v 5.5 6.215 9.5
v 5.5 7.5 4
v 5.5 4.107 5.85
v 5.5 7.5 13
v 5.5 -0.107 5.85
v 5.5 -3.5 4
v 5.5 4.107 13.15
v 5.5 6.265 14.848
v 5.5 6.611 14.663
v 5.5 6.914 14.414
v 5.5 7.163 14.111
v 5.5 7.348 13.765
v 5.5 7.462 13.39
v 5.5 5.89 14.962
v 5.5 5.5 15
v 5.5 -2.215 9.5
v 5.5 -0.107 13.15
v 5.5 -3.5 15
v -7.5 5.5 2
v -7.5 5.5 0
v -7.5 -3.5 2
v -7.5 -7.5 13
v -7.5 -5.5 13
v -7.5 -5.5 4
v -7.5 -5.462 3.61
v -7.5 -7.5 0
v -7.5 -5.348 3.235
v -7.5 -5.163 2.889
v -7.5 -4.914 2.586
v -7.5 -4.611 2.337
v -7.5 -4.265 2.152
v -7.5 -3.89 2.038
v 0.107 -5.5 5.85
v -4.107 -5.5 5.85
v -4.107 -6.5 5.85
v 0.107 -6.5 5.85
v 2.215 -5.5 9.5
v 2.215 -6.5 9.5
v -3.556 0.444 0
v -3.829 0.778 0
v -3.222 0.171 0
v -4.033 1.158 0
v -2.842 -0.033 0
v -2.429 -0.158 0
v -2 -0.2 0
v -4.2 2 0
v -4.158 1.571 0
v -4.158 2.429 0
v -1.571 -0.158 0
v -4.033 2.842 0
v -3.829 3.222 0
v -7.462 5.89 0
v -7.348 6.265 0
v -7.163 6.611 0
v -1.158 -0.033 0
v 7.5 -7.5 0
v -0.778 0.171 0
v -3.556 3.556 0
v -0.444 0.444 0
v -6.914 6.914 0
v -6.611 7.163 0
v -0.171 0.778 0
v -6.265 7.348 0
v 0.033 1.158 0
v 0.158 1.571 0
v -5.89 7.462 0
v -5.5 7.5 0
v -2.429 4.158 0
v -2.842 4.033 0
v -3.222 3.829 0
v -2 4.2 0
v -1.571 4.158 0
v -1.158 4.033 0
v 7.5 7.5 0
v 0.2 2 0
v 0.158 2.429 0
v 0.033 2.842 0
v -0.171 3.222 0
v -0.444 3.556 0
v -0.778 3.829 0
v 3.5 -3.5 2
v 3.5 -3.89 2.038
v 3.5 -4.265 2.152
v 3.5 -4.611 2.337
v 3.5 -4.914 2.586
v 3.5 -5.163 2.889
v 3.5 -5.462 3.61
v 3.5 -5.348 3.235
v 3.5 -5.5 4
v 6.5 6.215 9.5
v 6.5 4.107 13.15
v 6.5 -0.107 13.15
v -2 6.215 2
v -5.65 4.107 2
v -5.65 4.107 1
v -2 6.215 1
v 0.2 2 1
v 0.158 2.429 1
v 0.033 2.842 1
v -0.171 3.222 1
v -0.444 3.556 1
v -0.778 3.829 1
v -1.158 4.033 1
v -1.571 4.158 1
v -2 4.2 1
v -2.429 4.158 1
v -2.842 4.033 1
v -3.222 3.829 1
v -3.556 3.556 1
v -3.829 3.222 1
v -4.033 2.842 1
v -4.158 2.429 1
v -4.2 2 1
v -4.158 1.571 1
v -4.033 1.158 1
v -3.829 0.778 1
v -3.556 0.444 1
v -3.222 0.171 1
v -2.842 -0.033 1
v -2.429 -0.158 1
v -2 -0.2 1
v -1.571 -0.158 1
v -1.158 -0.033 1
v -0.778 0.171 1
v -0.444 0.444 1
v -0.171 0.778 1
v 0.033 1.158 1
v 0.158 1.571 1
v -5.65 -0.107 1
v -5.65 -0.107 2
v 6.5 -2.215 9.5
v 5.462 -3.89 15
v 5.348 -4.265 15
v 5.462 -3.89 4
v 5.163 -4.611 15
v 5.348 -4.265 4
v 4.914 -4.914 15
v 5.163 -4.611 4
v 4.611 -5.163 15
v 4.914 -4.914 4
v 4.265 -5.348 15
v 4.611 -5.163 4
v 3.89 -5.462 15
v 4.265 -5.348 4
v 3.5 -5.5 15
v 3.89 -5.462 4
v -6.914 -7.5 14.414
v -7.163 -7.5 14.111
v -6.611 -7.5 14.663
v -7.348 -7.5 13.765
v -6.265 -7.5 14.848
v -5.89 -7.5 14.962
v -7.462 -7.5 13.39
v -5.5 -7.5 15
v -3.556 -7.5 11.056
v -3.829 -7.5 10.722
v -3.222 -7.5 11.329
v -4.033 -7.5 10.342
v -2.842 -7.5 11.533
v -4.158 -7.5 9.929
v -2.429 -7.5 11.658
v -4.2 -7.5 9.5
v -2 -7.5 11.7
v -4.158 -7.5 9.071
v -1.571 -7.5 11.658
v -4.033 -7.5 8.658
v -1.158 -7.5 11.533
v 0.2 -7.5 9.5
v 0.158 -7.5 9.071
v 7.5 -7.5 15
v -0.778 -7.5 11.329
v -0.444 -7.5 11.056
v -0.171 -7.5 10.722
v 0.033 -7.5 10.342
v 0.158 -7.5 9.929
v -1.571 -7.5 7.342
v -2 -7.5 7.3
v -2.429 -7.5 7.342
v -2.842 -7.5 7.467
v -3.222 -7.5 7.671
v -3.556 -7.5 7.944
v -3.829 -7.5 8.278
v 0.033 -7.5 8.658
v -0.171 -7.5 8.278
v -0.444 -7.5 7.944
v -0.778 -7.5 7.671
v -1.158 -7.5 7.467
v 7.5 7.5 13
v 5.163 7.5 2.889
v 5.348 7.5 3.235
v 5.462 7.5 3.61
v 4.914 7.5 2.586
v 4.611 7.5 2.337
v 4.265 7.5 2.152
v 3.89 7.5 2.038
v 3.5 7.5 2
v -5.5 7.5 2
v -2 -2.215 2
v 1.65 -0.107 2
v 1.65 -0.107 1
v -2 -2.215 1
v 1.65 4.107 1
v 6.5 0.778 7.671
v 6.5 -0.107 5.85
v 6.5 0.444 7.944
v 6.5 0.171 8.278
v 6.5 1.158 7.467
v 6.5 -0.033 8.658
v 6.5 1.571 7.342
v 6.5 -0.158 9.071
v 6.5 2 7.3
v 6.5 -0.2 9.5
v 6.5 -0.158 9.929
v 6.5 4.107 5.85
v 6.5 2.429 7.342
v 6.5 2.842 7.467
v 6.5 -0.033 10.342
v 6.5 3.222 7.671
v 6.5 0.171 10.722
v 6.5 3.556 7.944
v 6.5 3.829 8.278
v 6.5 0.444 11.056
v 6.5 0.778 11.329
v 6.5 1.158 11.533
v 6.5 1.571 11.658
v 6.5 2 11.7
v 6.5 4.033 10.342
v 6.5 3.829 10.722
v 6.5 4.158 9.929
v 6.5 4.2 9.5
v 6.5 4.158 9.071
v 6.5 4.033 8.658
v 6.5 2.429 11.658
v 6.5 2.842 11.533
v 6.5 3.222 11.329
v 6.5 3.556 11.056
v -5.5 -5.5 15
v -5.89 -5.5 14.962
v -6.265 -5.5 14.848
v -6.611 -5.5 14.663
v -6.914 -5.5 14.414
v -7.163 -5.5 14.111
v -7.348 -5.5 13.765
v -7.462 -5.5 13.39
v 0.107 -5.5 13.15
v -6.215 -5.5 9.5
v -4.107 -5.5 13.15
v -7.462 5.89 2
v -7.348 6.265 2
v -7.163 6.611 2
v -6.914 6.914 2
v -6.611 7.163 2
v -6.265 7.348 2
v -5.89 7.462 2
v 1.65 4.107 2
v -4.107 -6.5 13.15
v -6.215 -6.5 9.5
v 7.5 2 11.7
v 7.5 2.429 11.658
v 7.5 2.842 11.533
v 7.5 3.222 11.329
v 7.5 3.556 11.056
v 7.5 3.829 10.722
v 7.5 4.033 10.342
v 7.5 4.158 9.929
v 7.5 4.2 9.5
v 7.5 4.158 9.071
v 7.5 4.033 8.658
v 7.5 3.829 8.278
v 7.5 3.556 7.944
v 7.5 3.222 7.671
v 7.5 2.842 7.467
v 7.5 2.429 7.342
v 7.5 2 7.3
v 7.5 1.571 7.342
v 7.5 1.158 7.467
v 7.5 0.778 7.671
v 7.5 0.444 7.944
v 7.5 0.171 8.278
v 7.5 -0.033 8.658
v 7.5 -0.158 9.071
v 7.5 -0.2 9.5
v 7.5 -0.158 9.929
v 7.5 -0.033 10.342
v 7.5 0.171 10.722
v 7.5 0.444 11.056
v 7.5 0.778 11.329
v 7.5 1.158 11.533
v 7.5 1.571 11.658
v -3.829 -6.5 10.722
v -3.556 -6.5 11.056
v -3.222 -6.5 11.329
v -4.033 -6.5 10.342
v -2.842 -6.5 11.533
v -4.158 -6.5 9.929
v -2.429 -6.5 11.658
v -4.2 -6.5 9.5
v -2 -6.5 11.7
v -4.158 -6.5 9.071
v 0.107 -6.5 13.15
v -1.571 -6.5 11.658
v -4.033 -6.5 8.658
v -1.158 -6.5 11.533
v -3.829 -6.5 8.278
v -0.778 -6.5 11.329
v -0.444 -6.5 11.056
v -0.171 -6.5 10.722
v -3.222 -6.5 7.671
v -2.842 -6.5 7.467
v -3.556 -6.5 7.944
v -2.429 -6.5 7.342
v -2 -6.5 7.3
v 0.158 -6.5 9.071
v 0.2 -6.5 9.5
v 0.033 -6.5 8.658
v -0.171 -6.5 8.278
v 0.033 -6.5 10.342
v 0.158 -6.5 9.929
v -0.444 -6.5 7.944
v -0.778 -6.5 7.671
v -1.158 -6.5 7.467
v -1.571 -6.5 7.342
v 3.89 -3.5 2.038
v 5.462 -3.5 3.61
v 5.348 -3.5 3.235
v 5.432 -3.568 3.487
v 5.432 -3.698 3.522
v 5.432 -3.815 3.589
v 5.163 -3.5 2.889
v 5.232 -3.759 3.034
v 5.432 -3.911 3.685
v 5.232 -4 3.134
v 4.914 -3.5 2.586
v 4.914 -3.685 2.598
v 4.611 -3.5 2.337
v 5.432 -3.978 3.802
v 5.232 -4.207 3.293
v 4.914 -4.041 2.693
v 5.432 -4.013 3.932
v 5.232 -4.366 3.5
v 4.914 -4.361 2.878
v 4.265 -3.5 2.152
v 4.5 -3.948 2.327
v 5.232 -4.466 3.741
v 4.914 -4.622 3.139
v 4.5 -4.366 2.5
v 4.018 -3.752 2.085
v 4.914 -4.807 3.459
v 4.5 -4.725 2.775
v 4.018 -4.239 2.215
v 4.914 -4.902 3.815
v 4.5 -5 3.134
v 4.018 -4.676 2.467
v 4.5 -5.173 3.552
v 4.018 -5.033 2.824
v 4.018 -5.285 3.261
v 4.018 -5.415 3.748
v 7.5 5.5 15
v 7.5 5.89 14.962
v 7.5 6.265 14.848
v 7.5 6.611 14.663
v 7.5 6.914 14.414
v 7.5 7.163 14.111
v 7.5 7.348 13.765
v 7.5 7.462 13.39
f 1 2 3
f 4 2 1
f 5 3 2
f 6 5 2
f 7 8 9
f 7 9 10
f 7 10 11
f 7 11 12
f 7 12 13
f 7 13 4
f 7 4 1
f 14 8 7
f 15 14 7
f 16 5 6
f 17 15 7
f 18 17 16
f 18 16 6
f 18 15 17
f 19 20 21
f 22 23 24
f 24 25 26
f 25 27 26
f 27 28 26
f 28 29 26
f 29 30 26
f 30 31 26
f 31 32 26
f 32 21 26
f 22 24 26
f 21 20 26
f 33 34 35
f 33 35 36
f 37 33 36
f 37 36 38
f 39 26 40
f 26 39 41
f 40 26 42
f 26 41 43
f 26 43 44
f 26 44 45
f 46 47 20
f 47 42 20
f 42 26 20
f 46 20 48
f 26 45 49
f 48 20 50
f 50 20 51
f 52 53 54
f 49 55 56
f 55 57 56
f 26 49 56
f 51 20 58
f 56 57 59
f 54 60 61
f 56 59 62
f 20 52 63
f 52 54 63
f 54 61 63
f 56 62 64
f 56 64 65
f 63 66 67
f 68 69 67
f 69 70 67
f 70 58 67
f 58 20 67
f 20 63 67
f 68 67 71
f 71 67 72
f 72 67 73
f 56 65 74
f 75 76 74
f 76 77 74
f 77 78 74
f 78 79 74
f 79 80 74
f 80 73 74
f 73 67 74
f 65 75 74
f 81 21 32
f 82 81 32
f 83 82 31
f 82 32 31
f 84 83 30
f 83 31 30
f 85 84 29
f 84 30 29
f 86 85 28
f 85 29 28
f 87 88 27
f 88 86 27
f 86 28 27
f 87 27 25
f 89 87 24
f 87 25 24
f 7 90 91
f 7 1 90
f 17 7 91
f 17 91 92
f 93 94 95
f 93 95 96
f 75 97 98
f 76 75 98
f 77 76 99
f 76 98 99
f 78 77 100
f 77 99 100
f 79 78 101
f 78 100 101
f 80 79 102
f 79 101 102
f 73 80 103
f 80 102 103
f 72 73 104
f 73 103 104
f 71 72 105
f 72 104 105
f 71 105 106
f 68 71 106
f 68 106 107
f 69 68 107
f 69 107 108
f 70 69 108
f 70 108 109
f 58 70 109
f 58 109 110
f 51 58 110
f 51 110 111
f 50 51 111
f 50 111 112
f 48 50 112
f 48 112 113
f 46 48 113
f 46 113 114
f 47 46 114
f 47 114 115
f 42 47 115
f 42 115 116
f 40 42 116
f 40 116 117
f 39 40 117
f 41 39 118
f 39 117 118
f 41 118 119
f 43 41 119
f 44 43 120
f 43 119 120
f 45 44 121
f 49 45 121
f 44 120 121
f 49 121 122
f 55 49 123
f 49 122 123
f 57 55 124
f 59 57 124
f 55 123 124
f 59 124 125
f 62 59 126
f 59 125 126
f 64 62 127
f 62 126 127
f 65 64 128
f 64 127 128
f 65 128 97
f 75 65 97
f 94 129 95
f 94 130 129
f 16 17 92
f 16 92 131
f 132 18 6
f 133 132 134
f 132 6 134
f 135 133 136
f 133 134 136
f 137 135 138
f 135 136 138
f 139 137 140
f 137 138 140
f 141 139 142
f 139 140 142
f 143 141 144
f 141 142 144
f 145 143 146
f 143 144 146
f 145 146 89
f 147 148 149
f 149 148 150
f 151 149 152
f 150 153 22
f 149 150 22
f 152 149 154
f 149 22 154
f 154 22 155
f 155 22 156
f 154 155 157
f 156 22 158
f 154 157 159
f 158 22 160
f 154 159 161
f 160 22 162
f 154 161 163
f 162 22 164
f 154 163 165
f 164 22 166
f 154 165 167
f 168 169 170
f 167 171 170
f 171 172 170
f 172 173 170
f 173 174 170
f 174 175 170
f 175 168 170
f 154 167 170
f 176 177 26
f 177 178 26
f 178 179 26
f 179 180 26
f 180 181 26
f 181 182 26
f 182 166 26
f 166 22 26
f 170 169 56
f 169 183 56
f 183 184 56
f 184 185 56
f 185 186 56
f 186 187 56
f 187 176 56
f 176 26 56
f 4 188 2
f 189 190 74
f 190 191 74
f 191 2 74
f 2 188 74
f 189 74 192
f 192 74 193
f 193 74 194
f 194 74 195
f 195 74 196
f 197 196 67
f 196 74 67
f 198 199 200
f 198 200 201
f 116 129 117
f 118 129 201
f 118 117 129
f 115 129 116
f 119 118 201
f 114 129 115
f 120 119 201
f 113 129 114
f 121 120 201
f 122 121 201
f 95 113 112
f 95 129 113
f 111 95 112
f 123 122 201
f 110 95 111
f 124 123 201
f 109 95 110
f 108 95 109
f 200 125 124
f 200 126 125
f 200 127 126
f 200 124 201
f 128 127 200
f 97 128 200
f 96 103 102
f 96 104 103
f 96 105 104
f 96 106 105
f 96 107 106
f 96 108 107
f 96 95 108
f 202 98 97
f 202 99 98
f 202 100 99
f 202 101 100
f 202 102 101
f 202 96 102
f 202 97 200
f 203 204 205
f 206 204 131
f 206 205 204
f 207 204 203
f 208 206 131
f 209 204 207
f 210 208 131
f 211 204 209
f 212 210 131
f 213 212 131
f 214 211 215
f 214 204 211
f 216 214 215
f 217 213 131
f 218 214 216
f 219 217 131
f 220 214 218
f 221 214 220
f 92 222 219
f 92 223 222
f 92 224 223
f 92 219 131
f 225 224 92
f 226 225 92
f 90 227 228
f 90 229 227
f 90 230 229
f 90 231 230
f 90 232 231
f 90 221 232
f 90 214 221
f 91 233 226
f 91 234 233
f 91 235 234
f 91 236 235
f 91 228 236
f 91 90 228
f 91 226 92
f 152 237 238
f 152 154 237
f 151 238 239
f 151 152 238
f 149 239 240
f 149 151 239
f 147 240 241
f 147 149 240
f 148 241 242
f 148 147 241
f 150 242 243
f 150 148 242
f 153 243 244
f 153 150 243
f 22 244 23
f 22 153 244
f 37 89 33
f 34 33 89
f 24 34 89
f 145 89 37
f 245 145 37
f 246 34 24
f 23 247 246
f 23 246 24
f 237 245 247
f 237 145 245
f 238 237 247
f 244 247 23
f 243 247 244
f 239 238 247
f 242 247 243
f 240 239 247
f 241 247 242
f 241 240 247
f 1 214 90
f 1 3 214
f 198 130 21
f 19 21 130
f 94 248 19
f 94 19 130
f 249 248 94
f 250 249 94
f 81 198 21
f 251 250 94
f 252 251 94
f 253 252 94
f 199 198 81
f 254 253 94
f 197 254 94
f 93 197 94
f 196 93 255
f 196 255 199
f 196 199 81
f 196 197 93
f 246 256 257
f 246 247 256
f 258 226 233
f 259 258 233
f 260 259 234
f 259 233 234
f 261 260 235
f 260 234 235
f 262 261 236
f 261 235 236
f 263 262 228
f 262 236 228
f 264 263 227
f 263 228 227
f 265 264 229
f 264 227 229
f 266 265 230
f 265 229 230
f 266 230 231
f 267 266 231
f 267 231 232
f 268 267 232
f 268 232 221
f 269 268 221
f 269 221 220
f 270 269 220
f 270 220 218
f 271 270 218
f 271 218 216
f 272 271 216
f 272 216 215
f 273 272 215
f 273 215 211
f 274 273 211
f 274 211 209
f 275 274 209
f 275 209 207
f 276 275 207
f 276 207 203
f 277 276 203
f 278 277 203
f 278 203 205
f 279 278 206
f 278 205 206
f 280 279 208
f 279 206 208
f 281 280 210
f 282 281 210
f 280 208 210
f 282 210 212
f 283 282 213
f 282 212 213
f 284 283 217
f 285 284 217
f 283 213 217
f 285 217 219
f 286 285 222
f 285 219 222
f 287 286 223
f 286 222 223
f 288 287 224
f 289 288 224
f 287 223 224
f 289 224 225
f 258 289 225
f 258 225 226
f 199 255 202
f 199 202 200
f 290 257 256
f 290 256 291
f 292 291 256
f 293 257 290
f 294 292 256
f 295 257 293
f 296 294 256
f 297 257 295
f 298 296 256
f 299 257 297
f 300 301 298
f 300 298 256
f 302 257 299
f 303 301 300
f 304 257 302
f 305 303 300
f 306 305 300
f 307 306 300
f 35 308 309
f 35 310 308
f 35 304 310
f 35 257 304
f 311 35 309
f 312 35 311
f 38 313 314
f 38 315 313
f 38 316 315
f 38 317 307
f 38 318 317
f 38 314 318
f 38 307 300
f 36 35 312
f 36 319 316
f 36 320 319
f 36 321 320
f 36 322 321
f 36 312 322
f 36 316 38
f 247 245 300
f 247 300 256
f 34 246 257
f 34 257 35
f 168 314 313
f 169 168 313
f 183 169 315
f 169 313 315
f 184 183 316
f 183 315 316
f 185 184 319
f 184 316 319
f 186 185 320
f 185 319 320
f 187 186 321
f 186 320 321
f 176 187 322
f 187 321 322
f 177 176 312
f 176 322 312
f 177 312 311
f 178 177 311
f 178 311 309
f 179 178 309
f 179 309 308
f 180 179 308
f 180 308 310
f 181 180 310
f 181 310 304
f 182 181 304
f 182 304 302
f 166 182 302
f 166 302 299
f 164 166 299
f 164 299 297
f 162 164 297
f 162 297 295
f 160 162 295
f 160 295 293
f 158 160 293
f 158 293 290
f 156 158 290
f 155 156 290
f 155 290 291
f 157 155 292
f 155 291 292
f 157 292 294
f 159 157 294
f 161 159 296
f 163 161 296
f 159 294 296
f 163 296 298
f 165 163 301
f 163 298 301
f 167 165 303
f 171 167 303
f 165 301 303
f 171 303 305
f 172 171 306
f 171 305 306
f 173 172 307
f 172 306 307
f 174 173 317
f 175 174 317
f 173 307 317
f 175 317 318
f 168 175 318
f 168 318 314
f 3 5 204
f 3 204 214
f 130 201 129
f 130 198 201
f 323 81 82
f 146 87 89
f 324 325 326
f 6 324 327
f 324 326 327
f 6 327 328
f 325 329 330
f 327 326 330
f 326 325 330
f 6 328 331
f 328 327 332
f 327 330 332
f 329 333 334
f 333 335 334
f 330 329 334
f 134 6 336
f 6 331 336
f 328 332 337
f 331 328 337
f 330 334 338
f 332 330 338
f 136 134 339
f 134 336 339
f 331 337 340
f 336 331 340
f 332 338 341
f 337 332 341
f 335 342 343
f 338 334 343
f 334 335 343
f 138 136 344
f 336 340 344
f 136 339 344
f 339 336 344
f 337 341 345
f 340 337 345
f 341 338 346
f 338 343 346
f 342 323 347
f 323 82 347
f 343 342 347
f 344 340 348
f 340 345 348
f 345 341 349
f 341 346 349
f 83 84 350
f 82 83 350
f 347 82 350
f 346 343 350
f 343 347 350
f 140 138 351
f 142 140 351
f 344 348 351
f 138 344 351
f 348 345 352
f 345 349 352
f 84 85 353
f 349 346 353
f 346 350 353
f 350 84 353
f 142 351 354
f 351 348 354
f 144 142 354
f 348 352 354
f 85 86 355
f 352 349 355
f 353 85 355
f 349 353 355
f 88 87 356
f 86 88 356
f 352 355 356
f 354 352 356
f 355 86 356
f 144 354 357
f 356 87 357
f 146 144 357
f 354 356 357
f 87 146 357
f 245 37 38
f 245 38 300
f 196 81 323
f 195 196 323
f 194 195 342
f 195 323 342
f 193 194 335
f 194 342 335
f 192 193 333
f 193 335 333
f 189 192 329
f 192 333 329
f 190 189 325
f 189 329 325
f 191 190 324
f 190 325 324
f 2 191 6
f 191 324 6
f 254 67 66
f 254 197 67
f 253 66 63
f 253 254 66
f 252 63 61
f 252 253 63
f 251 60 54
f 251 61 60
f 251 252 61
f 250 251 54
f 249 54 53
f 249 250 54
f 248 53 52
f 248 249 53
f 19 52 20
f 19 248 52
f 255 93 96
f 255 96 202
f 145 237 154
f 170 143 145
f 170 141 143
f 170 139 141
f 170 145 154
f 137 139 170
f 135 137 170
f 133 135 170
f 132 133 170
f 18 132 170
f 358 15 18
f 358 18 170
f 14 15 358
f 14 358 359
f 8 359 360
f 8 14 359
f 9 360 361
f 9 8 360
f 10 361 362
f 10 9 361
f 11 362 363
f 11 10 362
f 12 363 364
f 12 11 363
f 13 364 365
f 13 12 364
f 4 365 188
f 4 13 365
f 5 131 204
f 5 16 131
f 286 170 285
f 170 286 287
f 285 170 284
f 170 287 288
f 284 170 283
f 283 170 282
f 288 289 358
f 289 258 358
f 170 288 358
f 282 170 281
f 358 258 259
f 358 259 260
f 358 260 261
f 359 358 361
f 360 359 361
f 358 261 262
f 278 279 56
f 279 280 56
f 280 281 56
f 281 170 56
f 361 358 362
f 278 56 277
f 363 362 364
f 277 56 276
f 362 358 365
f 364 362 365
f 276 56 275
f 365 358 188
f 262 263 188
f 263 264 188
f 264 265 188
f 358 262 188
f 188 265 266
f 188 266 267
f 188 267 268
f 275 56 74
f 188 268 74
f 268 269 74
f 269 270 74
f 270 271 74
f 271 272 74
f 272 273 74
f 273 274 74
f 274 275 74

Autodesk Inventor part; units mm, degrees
ref_plane "YZ Plane" through (0, 0, 0) normal (1, 0, 0) x (0, 1, 0)
ref_plane "XZ Plane" through (0, 0, 0) normal (0, 1, 0) x (-1, 0, 0)
ref_plane "XY Plane" through (0, 0, 0) normal (0, 0, 1) x (1, 0, 0)
sketch "Sketch1" plane through (0, 0, 0) normal (0, 0, 1) x (1, 0, 0)
  line L0 (-7.5, -7.5) -> (7.5, -7.5)
  line L1 (7.5, -7.5) -> (7.5, 7.5)
  line L2 (7.5, 7.5) -> (-7.5, 7.5)
  line L3 (-7.5, 7.5) -> (-7.5, -7.5)
  line L4 (-7.5, -7.5) -> (7.5, 7.5) construction
  line L5 (7.5, -7.5) -> (-7.5, 7.5) construction
  point P0 (0, 0)
  dimension "d0" = 15
  dimension "d1" = 15
extrude "Extrusion1" add sketch "Sketch1" along normal blind 15
sketch "Sketch2" plane through (0, 0, 15) normal (0, 0, 1) x (1, 0, 0)
  line L0 (-7.5, 7.5) -> (-7.5, -7.5) projected
  line L1 (-7.5, 7.5) -> (5.5, 7.5)
  line L2 (5.5, 7.5) -> (5.5, -5.5)
  line L3 (5.5, -5.5) -> (-7.5, -5.5)
  line L4 (-7.5, -5.5) -> (-7.5, 7.5)
  line L5 (7.5, -7.5) -> (7.5, 7.5) projected
  line L6 (-7.5, -7.5) -> (7.5, -7.5) projected
  point P0 (0, 0)
  dimension "d4" = 2
  dimension "d5" = 2
extrude "Extrusion2" cut sketch "Sketch2" against normal blind 13
sketch "Sketch6" plane through (5.5, -5.5, 15) normal (-1, 0, 0) x (0, 0, 1)
  line L0 (-5.5, 11.7147) -> (-1.85, 9.6073)
  line L1 (-1.85, 9.6073) -> (-1.85, 5.3927)
  line L2 (-1.85, 5.3927) -> (-5.5, 3.2853)
  line L3 (-5.5, 3.2853) -> (-9.15, 5.3927)
  line L4 (-9.15, 5.3927) -> (-9.15, 9.6073)
  line L5 (-9.15, 9.6073) -> (-5.5, 11.7147)
  line L6 (0, 0) -> (-13, 0) projected
  line L7 (-13, 0) -> (-13, 13) projected
  line L8 (0, 13) -> (0, 0) projected
  point P0 (-15, 5.5)
  point P1 (-5.5, 7.5)
  dimension "d41" = 7.5
  dimension "d42" = 7.5
  dimension "d43" = 7.3
  dimension "d44" = 0
extrude "Extrusion3" cut sketch "Sketch6" against normal blind 1
sketch "Sketch7" plane through (6.5, -5.5, 15) normal (-1, 0, 0) x (0, 0, 1)
  circle A0 centre (-5.5, 7.5) radius 2.2
  line L0 (0, 0) -> (-13, 0) projected
  line L1 (-13, 0) -> (-13, 13) projected
  point P0 (-15, 5.5)
  dimension "d47" = 4.4
  dimension "d48" = 7.5
  dimension "d49" = 7.5
extrude "Extrusion4" cut sketch "Sketch7" against normal blind 1
sketch "Sketch8" plane through (-7.5, -5.5, 15) normal (0, 1, 0) x (1, 0, 0)
  line L0 (3.3927, 1.85) -> (1.2853, 5.5)
  line L1 (1.2853, 5.5) -> (3.3927, 9.15)
  line L2 (3.3927, 9.15) -> (7.6073, 9.15)
  line L3 (7.6073, 9.15) -> (9.7147, 5.5)
  line L4 (9.7147, 5.5) -> (7.6073, 1.85)
  line L5 (7.6073, 1.85) -> (3.3927, 1.85)
  line L6 (0, 13) -> (13, 13) projected
  line L7 (13, 13) -> (13, 0) projected
  line L8 (13, 0) -> (0, 0) projected
  point P0 (7.5, 15)
  point P1 (5.5, 5.5)
  dimension "d52" = 7.3
  dimension "d53" = 7.5
  dimension "d54" = 7.5
  dimension "d55" = 0
extrude "Extrusion5" cut sketch "Sketch8" against normal blind 1
sketch "Sketch9" plane through (-7.5, -6.5, 15) normal (0, 1, 0) x (1, 0, 0)
  circle A0 centre (5.5, 5.5) radius 2.2
  line L0 (0, 13) -> (13, 13) projected
  line L1 (0, 0) -> (0, 13) projected
  point P0 (7.5, 15)
  dimension "d58" = 4.4
  dimension "d59" = 7.5
  dimension "d60" = 5.5
extrude "Extrusion6" cut sketch "Sketch9" against normal blind 1
sketch "Sketch10" plane through (0, 0, 2) normal (0, 0, 1) x (1, 0, 0)
  line L0 (1.65, -0.1073) -> (-2, -2.2147)
  line L1 (-2, -2.2147) -> (-5.65, -0.1073)
  line L2 (-5.65, -0.1073) -> (-5.65, 4.1073)
  line L3 (-5.65, 4.1073) -> (-2, 6.2147)
  line L4 (-2, 6.2147) -> (1.65, 4.1073)
  line L5 (1.65, 4.1073) -> (1.65, -0.1073)
  line L6 (5.5, -5.5) -> (-7.5, -5.5) projected
  line L7 (5.5, 7.5) -> (5.5, -5.5) projected
  line L8 (-7.5, -5.5) -> (-7.5, 7.5) projected
  point P0 (0, 0)
  point P1 (-2, 2)
  dimension "d63" = 7.5
  dimension "d64" = 7.5
  dimension "d65" = 7.3
  dimension "d66" = 0
extrude "Extrusion7" cut sketch "Sketch10" against normal blind 1
sketch "Sketch11" plane through (0, 0, 1) normal (0, 0, 1) x (1, 0, 0)
  circle A0 centre (-2, 2) radius 2.2
  line L0 (5.5, 7.5) -> (5.5, -5.5) projected
  line L1 (5.5, -5.5) -> (-7.5, -5.5) projected
  point P0 (0, 0)
  dimension "d69" = 4.4
  dimension "d70" = 7.5
  dimension "d71" = 7.5
extrude "Extrusion8" cut sketch "Sketch11" against normal blind 1
fillet "Fillet2" radius 2 3 edges at (-1, -5.5, 2) (5.5, -5.5, 8.5) (5.5, 1, 2)
fillet "Fillet3" radius 2 3 edges at (-7.5, 7.5, 1) (6.5, 7.5, 15) (-7.5, -6.5, 15)
properties part number "23 bevestigings hoekjes 3 kanten"
